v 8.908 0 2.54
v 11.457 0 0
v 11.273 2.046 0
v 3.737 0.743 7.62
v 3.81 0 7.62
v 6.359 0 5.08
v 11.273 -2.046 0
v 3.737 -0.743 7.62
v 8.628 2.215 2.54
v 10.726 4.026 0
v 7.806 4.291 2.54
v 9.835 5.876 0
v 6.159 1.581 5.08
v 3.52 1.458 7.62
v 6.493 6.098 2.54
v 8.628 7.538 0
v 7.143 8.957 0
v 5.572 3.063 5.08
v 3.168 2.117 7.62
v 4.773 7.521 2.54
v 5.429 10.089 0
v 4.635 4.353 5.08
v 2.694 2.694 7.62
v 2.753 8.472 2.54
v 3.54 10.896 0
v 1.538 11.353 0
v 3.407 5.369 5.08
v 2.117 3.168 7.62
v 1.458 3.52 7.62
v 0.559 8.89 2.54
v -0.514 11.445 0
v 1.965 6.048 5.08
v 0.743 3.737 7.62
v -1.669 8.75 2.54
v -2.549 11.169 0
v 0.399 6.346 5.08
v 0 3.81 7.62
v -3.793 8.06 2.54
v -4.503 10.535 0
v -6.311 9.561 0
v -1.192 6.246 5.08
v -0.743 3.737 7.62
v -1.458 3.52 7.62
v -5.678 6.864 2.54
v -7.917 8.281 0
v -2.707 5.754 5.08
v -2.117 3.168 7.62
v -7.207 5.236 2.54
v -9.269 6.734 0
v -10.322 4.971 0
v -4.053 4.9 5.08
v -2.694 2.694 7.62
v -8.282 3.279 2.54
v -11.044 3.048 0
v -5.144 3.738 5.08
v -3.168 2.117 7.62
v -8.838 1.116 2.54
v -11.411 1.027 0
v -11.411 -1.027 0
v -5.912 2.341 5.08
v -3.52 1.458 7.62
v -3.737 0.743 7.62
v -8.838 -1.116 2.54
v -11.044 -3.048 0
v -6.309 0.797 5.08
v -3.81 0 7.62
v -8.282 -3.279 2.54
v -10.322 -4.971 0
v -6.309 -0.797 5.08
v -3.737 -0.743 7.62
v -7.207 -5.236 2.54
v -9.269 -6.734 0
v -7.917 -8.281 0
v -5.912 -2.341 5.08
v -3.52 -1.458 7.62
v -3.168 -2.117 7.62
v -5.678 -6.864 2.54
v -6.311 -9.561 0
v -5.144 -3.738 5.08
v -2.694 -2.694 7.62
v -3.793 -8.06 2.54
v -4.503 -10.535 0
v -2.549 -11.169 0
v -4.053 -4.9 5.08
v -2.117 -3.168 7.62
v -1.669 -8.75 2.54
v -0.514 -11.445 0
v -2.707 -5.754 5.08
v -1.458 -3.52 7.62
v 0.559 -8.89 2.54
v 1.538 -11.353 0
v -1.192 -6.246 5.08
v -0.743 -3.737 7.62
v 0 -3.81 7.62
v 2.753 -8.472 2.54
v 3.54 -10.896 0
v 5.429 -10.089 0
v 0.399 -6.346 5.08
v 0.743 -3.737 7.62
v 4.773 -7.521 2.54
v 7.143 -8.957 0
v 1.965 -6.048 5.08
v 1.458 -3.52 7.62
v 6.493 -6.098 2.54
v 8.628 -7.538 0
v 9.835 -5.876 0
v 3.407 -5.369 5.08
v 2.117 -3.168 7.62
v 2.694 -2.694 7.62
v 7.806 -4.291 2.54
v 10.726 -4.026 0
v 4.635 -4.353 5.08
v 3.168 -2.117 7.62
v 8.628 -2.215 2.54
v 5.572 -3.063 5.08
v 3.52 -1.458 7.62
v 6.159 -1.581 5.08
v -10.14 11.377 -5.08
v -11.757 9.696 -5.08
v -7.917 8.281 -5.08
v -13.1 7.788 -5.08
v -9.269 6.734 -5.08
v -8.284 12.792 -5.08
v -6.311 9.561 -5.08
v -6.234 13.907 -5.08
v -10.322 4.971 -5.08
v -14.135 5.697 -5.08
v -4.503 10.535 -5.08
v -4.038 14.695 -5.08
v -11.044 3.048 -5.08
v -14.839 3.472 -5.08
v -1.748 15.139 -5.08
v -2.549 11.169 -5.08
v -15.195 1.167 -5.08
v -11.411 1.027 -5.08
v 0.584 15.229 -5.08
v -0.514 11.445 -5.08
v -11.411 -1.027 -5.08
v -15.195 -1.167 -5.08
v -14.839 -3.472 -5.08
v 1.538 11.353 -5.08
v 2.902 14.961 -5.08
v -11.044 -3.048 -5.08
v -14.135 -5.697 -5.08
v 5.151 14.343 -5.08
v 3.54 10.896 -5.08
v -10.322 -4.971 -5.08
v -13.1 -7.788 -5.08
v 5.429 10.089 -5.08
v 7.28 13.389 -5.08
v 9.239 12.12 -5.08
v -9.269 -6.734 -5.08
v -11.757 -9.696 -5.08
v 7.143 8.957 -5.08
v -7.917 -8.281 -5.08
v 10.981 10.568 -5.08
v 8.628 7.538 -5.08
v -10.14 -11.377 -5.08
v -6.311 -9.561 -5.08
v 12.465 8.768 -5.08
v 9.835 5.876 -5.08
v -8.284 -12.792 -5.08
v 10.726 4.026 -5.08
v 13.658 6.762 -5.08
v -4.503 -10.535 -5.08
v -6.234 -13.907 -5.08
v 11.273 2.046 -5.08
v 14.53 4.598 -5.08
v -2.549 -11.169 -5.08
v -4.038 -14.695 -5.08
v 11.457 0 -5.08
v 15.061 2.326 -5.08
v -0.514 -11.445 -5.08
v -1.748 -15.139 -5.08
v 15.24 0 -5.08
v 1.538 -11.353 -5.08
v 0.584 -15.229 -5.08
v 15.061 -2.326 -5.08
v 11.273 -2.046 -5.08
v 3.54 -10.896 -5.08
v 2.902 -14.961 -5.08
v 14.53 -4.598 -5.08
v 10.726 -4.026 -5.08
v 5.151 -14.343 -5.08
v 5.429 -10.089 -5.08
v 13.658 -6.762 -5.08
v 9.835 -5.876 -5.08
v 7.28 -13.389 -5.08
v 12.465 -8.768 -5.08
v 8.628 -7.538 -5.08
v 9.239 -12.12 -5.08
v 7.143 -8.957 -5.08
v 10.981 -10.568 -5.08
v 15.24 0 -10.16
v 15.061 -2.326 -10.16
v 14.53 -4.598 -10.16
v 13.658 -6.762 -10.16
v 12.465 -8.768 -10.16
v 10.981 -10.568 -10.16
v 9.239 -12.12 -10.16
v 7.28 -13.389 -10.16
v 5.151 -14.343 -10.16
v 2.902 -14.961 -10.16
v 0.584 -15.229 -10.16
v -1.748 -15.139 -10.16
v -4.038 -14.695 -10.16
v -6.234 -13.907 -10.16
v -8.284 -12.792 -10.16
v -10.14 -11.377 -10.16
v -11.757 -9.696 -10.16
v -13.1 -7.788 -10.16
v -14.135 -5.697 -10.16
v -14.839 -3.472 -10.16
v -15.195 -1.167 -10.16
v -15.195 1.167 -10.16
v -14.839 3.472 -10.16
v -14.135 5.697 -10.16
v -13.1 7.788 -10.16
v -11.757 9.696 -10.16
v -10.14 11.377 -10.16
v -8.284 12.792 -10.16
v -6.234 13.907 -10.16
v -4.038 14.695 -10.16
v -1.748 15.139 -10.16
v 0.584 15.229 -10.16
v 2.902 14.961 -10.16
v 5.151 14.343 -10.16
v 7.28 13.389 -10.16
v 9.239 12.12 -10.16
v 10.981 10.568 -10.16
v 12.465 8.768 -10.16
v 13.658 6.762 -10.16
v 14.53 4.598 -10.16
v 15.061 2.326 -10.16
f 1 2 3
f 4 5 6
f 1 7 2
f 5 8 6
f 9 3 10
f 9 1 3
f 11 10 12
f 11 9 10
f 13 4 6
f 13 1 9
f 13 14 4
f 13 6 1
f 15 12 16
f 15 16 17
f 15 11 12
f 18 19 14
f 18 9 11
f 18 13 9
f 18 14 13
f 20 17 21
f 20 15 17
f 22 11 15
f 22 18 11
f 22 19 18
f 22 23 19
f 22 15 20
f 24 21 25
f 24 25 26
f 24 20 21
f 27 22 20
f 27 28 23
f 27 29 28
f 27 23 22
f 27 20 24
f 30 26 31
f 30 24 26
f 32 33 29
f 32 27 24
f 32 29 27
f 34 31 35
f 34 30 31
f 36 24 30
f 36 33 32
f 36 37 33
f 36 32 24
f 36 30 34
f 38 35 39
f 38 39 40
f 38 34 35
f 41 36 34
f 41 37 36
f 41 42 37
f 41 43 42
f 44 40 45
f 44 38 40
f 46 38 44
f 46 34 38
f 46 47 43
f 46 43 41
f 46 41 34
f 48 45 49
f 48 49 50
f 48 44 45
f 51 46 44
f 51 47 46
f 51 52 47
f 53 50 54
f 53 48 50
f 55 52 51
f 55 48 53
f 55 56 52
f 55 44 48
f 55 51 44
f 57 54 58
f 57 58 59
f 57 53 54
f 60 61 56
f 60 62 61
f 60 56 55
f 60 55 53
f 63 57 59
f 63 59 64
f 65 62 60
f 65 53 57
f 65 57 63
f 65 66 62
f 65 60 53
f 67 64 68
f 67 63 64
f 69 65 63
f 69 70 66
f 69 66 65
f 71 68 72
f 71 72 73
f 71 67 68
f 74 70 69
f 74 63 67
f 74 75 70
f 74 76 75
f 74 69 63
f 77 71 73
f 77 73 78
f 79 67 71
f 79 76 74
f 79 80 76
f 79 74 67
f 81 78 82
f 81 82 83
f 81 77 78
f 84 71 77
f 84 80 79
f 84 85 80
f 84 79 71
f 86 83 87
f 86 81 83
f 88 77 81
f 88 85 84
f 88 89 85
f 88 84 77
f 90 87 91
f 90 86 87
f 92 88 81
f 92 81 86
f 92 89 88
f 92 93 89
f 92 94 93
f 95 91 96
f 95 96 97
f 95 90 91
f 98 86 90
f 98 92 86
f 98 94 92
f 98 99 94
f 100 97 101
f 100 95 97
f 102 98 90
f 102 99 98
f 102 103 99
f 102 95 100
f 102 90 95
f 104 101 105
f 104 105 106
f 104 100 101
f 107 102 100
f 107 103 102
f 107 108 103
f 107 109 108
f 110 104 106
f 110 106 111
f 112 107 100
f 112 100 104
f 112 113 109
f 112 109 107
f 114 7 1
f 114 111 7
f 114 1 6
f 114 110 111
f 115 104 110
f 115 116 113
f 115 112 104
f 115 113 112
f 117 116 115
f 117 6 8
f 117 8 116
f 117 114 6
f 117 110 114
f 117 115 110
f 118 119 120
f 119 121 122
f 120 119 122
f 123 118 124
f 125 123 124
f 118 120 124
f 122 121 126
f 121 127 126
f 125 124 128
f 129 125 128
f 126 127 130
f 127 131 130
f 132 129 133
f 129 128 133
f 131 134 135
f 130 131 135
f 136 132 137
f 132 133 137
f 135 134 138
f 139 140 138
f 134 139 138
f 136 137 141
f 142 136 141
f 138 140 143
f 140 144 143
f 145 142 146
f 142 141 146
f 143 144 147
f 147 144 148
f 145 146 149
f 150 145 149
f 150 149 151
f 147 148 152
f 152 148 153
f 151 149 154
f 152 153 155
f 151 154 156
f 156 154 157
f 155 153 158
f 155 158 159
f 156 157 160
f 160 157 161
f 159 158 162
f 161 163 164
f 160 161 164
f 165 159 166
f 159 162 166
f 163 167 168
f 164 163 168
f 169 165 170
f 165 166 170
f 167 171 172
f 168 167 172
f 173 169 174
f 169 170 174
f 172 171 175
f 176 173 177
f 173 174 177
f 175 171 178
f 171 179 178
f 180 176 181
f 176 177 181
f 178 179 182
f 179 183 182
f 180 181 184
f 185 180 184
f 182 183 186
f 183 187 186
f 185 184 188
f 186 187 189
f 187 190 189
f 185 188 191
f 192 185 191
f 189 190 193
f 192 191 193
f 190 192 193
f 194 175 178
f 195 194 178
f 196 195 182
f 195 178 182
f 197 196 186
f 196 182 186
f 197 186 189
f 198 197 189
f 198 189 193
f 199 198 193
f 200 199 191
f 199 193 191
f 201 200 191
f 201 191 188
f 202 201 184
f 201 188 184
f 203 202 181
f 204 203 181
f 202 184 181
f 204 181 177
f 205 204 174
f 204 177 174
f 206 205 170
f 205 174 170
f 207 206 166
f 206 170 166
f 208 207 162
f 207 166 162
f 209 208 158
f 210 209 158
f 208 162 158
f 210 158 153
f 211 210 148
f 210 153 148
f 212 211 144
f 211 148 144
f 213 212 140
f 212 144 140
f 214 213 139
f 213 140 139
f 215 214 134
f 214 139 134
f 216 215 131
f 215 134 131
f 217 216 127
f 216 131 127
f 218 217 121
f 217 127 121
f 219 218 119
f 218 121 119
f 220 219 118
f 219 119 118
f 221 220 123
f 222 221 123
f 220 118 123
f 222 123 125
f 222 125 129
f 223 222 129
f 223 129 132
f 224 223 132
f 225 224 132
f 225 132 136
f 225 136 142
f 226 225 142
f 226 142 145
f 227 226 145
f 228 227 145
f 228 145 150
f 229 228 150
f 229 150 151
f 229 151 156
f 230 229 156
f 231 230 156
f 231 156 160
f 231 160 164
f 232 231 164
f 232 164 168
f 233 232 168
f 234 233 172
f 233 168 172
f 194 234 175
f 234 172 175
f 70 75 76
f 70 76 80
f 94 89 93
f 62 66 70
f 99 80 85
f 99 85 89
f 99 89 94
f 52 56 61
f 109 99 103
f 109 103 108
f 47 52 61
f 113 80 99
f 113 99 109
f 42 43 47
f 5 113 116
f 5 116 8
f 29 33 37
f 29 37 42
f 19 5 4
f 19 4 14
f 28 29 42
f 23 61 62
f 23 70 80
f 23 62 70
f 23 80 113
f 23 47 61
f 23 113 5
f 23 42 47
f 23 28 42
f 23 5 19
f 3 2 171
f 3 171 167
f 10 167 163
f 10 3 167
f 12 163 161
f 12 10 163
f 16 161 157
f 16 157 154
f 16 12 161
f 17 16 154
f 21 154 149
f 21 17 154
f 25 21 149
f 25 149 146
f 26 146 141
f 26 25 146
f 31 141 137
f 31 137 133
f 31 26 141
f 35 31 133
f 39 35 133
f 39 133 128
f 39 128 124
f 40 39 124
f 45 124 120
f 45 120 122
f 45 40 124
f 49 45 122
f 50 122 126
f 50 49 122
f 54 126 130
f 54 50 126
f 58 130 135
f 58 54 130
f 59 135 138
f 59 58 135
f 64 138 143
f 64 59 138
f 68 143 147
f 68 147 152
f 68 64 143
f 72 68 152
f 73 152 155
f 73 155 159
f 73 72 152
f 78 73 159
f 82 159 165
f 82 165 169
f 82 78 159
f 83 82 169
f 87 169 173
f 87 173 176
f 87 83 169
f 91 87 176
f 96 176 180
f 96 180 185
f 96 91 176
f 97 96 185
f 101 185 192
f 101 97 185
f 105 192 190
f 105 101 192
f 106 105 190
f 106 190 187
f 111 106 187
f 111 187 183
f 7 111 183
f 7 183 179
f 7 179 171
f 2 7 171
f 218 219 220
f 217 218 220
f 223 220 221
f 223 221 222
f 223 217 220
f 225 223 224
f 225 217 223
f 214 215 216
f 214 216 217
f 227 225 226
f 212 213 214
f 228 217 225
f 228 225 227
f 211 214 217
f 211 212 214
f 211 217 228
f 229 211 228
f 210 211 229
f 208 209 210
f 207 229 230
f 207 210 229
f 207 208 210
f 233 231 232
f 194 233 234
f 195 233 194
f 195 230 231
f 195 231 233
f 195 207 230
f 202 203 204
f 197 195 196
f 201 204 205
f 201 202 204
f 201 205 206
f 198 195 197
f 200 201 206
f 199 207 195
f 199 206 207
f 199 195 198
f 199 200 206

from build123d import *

# Parameters (mm, degrees)
F0_R     = 12.7
F1_DEPTH = 7.62
F3_DEPTH = 5.08
F7_R     = 15.24
F8_DEPTH = 5.08


# Not quite as in the source:
# - a fillet or chamfer that OpenCascade refuses, or shapes differently, is made with other operations: its cross-section is extruded or revolved along the edge and cut away or added
# - the program builds the solid bodies; features that only make, move or delete a surface that nothing else refers to are left out


with BuildPart() as f1:
    # F0 (on Top) → F1 (new body)
    with BuildSketch(Plane.XY):
        Circle(F0_R)
    extrude(amount=F1_DEPTH)

    # F2: chamfer of 8.89 x 8.8590220811 on 1 edges, made by hand

    # F2_s1 → F2_t2 (revolve, cut)
    with BuildSketch(Plane.XZ):
        Polygon((12.7, -1.2390220811), (3.81, 7.62), (12.7, 7.62), align=None)
    revolve(axis=Axis((0, 0, 7.62), (0, 0, 1)), mode=Mode.SUBTRACT)

    # F3 (add): a face of the model
    f3_faces = [f1.faces().sort_by_distance(p)[0] for p in [
        (0, 0, 0),
    ]]
    extrude(f3_faces, amount=F3_DEPTH)

    # F7 (on face) → F8 (join)
    with BuildSketch(Plane(origin=(0, 0, -5.08), x_dir=(1, 0, 0), z_dir=(0, 0, -1))):
        Circle(F7_R)
    extrude(amount=F8_DEPTH)


solid = f1.part
